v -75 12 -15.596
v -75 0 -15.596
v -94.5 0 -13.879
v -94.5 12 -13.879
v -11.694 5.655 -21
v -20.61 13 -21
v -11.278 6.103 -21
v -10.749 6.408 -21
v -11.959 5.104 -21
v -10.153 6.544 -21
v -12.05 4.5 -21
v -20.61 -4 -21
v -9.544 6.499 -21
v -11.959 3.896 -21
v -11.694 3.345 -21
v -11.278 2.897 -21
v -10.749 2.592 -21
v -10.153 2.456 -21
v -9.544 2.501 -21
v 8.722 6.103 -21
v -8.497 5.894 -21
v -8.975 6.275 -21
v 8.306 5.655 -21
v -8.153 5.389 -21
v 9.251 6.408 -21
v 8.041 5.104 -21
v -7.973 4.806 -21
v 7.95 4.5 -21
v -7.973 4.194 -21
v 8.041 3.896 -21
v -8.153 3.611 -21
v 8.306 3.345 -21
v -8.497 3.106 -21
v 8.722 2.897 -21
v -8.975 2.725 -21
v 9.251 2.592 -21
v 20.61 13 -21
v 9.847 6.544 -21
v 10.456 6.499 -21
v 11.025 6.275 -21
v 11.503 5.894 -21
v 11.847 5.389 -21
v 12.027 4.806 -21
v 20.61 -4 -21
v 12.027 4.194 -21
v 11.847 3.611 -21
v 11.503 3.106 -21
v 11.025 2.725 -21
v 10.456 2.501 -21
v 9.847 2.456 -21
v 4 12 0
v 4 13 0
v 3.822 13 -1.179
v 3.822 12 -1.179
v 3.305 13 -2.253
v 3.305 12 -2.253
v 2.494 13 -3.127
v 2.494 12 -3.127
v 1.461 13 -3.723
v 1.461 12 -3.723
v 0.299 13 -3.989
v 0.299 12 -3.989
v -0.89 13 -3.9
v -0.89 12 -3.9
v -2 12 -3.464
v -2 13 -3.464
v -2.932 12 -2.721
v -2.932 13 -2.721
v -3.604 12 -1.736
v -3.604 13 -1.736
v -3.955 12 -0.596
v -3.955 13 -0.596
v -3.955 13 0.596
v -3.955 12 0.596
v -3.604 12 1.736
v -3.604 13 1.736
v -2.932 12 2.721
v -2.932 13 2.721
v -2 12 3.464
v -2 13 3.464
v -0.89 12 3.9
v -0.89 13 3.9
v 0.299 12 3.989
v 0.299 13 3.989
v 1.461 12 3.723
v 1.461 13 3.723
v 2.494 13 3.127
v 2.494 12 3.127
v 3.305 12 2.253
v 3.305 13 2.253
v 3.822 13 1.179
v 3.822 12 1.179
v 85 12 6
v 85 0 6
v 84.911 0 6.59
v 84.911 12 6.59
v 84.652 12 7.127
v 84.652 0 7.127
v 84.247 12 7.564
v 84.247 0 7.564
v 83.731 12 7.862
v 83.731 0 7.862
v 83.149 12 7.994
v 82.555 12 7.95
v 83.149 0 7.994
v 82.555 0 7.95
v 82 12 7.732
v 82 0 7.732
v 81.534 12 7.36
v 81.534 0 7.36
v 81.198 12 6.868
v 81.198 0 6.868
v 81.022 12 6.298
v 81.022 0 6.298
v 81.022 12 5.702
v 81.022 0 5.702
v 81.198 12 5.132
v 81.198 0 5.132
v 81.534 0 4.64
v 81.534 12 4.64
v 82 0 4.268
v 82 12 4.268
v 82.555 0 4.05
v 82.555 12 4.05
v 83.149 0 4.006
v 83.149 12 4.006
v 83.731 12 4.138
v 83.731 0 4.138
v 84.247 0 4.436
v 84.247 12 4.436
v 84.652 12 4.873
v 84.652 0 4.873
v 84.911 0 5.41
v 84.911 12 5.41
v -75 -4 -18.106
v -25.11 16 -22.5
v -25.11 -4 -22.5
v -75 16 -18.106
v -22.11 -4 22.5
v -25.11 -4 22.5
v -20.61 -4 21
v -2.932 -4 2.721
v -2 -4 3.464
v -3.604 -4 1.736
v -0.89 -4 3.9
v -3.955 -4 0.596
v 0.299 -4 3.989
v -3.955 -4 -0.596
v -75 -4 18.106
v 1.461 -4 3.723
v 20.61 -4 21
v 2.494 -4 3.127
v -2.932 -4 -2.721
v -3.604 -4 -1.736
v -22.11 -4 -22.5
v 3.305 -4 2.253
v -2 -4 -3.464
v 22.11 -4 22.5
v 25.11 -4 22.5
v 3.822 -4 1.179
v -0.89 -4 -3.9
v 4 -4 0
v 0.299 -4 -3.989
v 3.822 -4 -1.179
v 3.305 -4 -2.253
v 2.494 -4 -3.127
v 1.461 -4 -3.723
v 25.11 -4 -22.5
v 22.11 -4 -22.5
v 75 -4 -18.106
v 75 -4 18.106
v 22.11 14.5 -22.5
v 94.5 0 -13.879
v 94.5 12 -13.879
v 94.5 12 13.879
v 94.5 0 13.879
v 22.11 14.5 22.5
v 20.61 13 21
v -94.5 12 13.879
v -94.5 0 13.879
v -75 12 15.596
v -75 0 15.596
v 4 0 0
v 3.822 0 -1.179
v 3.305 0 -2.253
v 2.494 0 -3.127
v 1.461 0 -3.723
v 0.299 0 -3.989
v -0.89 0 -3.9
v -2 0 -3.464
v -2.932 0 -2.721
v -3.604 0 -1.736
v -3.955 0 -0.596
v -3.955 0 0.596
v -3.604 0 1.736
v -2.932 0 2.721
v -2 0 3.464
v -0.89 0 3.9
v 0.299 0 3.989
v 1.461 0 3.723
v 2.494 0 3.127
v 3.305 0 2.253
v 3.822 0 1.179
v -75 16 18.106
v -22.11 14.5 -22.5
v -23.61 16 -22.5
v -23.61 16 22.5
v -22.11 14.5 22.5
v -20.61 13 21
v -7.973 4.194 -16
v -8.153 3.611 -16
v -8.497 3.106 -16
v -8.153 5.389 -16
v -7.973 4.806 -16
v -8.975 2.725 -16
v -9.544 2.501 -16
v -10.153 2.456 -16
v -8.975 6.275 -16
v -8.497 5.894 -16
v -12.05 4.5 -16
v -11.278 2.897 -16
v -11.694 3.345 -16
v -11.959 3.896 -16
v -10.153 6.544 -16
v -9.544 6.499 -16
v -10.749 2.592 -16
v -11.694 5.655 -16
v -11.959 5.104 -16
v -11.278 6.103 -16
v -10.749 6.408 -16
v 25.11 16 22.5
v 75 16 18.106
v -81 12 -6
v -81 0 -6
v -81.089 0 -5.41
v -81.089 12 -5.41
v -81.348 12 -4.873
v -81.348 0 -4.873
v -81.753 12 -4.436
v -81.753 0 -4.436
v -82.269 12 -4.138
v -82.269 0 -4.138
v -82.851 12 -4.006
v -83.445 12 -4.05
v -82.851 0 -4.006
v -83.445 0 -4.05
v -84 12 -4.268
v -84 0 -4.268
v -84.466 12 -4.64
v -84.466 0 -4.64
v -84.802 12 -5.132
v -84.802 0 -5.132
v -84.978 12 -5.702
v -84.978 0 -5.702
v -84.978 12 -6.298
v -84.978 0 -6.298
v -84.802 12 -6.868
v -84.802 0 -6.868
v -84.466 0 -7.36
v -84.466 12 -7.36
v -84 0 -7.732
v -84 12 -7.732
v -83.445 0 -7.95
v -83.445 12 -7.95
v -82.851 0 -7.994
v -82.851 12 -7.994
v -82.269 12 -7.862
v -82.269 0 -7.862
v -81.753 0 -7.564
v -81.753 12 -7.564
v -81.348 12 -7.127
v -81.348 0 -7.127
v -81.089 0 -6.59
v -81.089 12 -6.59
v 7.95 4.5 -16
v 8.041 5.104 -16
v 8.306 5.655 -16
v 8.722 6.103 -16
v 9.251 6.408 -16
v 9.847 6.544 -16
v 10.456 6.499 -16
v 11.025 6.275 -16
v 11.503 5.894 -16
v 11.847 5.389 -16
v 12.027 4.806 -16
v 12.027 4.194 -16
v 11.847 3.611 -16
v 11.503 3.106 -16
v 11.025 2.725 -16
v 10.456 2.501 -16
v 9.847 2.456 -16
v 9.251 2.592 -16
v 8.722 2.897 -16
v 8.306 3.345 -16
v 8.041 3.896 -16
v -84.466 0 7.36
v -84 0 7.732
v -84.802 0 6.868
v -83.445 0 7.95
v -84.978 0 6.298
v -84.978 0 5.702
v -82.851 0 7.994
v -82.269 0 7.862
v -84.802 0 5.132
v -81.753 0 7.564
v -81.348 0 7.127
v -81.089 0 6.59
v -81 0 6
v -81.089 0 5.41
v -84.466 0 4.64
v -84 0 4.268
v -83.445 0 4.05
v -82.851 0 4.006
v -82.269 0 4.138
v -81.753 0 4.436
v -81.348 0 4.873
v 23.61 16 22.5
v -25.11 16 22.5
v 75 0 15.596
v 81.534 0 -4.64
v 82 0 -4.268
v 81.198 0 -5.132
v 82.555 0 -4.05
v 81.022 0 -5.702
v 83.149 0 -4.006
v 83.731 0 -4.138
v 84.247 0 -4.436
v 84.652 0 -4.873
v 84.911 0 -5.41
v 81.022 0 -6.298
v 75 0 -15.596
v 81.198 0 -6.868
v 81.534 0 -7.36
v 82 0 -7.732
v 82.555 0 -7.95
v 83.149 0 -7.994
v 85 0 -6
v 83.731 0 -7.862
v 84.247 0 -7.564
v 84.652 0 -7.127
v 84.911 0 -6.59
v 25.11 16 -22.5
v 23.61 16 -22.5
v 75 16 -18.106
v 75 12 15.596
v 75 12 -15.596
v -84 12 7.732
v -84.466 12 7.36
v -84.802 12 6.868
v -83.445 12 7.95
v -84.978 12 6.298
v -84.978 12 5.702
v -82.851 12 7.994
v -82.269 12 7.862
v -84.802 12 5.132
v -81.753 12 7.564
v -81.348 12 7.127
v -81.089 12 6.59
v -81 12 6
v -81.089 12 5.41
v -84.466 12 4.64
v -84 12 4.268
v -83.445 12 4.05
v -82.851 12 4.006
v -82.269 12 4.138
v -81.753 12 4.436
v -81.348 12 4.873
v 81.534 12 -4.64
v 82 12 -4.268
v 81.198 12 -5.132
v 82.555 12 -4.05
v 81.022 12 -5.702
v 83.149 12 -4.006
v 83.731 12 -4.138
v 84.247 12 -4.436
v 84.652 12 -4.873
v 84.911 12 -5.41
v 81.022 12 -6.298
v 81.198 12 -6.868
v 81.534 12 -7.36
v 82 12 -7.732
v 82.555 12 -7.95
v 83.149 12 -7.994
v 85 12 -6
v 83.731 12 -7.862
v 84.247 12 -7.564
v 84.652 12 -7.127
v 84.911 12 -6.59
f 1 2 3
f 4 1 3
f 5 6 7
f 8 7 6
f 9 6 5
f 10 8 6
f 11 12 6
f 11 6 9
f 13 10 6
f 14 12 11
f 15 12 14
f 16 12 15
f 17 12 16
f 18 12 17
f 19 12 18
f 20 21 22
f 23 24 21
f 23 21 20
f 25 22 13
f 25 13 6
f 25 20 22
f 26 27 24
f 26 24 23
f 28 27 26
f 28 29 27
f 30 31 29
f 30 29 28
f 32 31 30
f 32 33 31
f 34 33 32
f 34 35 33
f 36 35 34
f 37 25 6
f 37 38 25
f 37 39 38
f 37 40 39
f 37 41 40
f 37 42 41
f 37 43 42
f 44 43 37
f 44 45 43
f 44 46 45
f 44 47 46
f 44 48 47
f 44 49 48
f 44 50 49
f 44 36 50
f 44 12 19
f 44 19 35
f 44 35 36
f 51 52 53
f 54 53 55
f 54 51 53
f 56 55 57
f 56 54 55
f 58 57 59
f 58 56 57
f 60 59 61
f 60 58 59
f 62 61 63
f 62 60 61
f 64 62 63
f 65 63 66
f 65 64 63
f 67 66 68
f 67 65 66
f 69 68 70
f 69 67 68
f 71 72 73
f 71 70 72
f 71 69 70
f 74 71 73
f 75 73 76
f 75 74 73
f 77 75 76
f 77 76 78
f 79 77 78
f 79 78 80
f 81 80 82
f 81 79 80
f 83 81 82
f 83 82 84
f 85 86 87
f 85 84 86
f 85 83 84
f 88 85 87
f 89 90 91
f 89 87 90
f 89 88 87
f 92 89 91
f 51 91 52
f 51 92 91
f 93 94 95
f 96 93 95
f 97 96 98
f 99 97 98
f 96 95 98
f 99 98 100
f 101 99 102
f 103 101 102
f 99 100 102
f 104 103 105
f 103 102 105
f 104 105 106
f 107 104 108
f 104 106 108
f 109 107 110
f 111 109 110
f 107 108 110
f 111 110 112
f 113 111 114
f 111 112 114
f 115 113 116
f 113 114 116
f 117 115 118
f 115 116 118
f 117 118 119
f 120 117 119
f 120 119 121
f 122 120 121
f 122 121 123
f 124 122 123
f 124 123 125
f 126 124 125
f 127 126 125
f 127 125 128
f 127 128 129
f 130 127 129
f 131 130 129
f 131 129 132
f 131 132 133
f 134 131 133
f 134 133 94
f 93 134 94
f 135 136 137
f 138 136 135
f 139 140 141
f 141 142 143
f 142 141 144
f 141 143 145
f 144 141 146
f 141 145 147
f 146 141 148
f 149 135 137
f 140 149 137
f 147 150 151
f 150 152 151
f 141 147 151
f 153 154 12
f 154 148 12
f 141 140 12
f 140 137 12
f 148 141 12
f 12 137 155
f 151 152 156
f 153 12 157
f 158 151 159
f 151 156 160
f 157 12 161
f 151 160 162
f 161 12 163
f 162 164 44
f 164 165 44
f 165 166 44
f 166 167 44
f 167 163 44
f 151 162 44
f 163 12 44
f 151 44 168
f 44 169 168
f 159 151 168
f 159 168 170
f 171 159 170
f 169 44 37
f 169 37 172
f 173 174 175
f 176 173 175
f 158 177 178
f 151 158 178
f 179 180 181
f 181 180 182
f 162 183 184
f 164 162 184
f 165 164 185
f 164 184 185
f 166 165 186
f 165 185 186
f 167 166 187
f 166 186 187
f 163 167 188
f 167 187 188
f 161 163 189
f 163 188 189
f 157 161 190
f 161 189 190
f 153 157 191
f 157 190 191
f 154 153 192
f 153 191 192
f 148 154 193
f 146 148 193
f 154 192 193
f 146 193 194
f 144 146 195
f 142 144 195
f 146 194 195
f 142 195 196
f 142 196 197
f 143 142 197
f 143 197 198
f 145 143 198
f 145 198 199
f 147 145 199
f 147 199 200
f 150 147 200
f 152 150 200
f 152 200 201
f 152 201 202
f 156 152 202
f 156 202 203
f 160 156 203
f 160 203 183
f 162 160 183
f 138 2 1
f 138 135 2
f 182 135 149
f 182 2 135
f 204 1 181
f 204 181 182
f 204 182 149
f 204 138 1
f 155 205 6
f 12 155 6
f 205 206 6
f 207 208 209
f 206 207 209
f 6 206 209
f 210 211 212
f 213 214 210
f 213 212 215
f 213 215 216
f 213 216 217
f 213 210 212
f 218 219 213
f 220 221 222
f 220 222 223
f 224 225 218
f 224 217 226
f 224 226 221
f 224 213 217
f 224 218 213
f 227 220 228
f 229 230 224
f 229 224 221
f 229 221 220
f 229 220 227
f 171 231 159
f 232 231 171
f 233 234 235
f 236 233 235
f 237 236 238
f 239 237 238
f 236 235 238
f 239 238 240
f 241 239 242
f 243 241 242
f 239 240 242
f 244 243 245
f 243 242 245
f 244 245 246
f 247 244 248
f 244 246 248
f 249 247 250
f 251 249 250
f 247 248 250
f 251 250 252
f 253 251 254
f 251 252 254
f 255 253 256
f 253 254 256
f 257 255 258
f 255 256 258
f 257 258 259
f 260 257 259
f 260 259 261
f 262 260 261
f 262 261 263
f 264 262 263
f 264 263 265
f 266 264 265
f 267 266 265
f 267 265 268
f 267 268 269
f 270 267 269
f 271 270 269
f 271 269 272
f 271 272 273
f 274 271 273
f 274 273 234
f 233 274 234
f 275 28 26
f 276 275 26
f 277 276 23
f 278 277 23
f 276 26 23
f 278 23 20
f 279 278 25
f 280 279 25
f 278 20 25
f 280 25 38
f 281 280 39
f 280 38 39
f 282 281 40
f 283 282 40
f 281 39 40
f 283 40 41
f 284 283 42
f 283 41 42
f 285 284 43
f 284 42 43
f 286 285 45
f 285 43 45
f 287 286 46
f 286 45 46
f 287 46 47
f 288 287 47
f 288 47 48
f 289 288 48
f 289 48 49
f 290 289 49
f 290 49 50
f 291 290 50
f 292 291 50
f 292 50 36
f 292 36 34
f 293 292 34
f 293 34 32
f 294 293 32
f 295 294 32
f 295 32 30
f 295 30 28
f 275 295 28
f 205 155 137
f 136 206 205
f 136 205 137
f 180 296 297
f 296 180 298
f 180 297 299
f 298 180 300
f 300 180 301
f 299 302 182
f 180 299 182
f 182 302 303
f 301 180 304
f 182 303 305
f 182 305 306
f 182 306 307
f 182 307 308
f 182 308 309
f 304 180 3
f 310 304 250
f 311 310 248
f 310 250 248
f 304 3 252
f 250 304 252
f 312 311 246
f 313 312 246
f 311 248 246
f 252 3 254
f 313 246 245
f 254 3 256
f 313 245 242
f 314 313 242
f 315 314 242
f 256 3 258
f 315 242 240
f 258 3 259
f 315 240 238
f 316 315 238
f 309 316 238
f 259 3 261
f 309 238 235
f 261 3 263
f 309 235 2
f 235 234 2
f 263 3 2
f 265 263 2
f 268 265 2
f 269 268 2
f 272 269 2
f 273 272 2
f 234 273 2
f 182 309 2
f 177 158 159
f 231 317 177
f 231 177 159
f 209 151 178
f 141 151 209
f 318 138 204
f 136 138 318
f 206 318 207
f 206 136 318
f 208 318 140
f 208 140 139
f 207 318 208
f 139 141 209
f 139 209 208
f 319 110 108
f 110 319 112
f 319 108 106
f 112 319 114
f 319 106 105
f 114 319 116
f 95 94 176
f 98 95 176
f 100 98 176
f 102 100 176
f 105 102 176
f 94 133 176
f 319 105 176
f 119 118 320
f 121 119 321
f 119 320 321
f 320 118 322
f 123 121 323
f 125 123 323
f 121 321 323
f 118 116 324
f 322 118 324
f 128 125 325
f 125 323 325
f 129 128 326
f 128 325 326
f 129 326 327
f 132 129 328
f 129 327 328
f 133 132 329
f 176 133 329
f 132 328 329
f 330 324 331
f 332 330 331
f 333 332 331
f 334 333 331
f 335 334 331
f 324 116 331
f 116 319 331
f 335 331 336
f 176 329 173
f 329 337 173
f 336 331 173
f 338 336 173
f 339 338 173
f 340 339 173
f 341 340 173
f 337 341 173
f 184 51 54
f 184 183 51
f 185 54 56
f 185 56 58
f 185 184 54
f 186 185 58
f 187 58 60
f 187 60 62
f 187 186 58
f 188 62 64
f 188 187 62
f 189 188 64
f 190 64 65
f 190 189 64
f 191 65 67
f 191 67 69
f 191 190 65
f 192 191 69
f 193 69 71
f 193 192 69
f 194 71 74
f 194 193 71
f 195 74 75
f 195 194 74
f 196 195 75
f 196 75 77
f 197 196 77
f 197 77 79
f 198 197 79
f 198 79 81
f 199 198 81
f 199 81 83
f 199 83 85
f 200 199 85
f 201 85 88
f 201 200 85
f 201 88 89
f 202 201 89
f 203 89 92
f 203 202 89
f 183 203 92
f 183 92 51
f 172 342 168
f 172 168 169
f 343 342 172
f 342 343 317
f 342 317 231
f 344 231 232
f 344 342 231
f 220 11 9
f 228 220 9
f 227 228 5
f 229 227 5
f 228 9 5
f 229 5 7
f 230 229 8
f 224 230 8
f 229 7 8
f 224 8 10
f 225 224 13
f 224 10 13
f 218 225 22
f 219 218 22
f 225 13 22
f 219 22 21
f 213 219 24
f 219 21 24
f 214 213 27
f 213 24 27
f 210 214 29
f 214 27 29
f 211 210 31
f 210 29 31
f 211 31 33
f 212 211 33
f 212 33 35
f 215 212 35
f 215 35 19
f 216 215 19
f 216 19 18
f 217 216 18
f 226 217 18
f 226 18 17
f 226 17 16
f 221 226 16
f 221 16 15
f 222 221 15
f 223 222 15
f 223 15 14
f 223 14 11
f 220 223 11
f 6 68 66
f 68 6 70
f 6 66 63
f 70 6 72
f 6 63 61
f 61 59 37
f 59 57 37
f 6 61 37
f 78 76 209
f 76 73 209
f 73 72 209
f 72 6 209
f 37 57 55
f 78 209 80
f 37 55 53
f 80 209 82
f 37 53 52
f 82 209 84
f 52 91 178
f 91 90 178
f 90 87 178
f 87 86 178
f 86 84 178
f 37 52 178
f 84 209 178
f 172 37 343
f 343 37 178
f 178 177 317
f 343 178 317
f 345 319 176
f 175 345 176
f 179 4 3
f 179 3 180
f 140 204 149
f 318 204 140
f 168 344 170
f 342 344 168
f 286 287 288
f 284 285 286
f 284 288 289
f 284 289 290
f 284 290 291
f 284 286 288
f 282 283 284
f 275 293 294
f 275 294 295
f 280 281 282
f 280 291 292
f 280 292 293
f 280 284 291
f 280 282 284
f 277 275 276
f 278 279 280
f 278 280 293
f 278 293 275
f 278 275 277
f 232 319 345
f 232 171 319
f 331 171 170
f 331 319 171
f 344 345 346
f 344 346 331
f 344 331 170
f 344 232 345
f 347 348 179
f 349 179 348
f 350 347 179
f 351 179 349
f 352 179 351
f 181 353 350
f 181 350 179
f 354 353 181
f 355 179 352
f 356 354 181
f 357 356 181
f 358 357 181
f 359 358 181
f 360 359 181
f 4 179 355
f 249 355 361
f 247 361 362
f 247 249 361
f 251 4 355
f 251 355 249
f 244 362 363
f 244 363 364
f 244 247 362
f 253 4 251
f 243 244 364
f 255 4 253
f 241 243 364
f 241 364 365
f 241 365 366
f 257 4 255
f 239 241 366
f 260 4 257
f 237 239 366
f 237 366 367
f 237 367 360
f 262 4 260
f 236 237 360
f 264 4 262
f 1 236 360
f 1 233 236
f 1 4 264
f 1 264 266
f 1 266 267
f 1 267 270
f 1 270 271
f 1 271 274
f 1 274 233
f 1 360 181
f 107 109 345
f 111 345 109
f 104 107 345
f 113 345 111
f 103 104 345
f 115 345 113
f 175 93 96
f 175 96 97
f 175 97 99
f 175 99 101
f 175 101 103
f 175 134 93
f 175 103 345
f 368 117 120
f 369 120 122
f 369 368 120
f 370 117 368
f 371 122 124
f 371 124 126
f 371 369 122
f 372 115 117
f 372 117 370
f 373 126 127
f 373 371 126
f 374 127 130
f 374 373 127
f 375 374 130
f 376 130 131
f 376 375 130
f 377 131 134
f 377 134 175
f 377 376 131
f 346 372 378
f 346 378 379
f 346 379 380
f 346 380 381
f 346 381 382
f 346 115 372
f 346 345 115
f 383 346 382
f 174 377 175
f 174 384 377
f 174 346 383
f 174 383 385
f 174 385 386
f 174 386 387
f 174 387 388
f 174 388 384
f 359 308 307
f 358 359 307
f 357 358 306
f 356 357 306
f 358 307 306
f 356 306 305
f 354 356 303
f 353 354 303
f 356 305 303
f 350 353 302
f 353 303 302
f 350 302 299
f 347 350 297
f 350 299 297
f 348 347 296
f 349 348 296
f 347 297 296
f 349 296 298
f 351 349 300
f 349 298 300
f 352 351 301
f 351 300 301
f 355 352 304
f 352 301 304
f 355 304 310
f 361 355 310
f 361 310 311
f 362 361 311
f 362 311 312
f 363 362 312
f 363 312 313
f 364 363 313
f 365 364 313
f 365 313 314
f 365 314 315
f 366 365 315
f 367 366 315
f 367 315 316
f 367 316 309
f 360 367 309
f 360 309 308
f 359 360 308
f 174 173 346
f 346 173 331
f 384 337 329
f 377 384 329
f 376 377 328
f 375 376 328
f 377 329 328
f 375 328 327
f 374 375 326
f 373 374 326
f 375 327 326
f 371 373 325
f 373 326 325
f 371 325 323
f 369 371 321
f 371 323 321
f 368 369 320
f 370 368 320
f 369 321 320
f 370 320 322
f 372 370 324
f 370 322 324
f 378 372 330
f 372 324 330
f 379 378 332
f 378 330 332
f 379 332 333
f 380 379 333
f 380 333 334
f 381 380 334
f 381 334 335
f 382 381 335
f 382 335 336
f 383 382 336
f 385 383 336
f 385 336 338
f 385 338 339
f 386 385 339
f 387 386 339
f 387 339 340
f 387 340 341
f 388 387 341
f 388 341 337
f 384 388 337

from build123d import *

# Parameters (mm, degrees)
SKETCH1_R                = 4
BOSS_EXTRUDE1_DEPTH      = 12
SKETCH2_R                = 4
BOSS_EXTRUDE2_DEPTH      = 4
BOSS_EXTRUDE2_DEPTH_BACK = 16
CUT_EXTRUDE1_DEPTH       = 1
CUT_EXTRUDE1_DEPTH_BACK  = 46
SKETCH6_R                = 2.05
CUT_EXTRUDE3_DEPTH       = 6.5
SKETCH7_R                = 2
CUT_EXTRUDE4_DEPTH       = 17
CUT_EXTRUDE5_DEPTH       = 1
CUT_EXTRUDE5_DEPTH_BACK  = 21
CUT_EXTRUDE6_DEPTH       = 17


with BuildPart() as part:
    # Sketch1 → Boss-Extrude1 (new body)
    with BuildSketch(Plane(origin=(0, 0, 0), x_dir=(1, 0, 0), z_dir=(0, 1, 0))):
        Polygon((25, 20), (-25, 20), (-95, 13.834935185), (-95, -13.834935185), (-25, -20), (25, -20), (95, -13.834935185), (95, 13.834935185), align=None)
        Circle(SKETCH1_R, mode=Mode.SUBTRACT)
    extrude(amount=BOSS_EXTRUDE1_DEPTH)

    # Sketch2 → Boss-Extrude2 (add, two sides)
    with BuildSketch(Plane(origin=(0, 12, 0), x_dir=(1, 0, 0), z_dir=(0, 1, 0))) as boss_extrude2_sk:
        Polygon((-25, 20), (-75, 15.596382275), (-75, -15.596382275), (-25, -20), (25, -20), (75, -15.596382275), (75, 15.596382275), (25, 20), align=None)
        Circle(SKETCH2_R, mode=Mode.SUBTRACT)
        Polygon((-25, -20), (-75, -15.596382275), (-75, -18.10605947), (-25.109877781, -22.5), (25.109877781, -22.5), (75, -18.10605947), (75, -15.596382275), (25, -20), align=None)
        Polygon((-25.109877781, 22.5), (-75, 18.10605947), (-75, 15.596382275), (-25, 20), (25, 20), (75, 15.596382275), (75, 18.10605947), (25.109877781, 22.5), align=None)
    extrude(amount=BOSS_EXTRUDE2_DEPTH)
    extrude(boss_extrude2_sk.sketch, amount=-BOSS_EXTRUDE2_DEPTH_BACK)

    # Sketch3 → Cut-Extrude1 (cut, two sides)
    with BuildSketch(Plane.XY.offset(22.5)) as cut_extrude1_sk:
        Polygon((23.609877781, 16), (-23.609877781, 16), (-20.609877781, 13), (20.609877781, 13), align=None)
    extrude(amount=CUT_EXTRUDE1_DEPTH, mode=Mode.SUBTRACT)
    extrude(cut_extrude1_sk.sketch, amount=-CUT_EXTRUDE1_DEPTH_BACK, mode=Mode.SUBTRACT)

    # Sketch6 → Cut-Extrude3 (cut)
    with BuildSketch(Plane(origin=(0, 0, -22.5), x_dir=(-1, 0, 0), z_dir=(0, 0, -1))):
        with Locations((-10, 4.5)):
            Circle(SKETCH6_R)
        with Locations((10, 4.5)):
            Circle(SKETCH6_R)
    extrude(amount=-CUT_EXTRUDE3_DEPTH, mode=Mode.SUBTRACT)

    # Sketch7 → Cut-Extrude4 (cut, through all)
    with BuildSketch(Plane.XZ):
        with Locations((-83, -6)):
            Circle(SKETCH7_R)
        with Locations((-83, 6)):
            Circle(SKETCH7_R)
        with Locations((83, 6)):
            Circle(SKETCH7_R)
        with Locations((83, -6)):
            Circle(SKETCH7_R)
    extrude(amount=-CUT_EXTRUDE4_DEPTH, mode=Mode.SUBTRACT)

    # Sketch8 → Cut-Extrude5 (cut, two sides)
    with BuildSketch(Plane.XZ.offset(4)) as cut_extrude5_sk:
        Polygon((-22.109877781, -22.5), (-20.609877781, -21), (20.609877781, -21), (22.109877781, -22.5), align=None)
        Polygon((-22.109877781, 22.5), (22.109877781, 22.5), (20.609877781, 21), (-20.609877781, 21), align=None)
    extrude(amount=CUT_EXTRUDE5_DEPTH, mode=Mode.SUBTRACT)
    extrude(cut_extrude5_sk.sketch, amount=-CUT_EXTRUDE5_DEPTH_BACK, mode=Mode.SUBTRACT)

    # Sketch9 → Cut-Extrude6 (cut, through all)
    with BuildSketch(Plane(origin=(0, 12, 0), x_dir=(1, 0, 0), z_dir=(0, 1, 0))):
        Polygon((-94.5, 13.878971362), (-94.5, -13.878971362), (-95, -13.834935185), (-95, 13.834935185), align=None)
        Polygon((94.5, 13.878971362), (94.5, -13.878971362), (95, -13.834935185), (95, 13.834935185), align=None)
    extrude(amount=-CUT_EXTRUDE6_DEPTH, mode=Mode.SUBTRACT)


solid = part.part
